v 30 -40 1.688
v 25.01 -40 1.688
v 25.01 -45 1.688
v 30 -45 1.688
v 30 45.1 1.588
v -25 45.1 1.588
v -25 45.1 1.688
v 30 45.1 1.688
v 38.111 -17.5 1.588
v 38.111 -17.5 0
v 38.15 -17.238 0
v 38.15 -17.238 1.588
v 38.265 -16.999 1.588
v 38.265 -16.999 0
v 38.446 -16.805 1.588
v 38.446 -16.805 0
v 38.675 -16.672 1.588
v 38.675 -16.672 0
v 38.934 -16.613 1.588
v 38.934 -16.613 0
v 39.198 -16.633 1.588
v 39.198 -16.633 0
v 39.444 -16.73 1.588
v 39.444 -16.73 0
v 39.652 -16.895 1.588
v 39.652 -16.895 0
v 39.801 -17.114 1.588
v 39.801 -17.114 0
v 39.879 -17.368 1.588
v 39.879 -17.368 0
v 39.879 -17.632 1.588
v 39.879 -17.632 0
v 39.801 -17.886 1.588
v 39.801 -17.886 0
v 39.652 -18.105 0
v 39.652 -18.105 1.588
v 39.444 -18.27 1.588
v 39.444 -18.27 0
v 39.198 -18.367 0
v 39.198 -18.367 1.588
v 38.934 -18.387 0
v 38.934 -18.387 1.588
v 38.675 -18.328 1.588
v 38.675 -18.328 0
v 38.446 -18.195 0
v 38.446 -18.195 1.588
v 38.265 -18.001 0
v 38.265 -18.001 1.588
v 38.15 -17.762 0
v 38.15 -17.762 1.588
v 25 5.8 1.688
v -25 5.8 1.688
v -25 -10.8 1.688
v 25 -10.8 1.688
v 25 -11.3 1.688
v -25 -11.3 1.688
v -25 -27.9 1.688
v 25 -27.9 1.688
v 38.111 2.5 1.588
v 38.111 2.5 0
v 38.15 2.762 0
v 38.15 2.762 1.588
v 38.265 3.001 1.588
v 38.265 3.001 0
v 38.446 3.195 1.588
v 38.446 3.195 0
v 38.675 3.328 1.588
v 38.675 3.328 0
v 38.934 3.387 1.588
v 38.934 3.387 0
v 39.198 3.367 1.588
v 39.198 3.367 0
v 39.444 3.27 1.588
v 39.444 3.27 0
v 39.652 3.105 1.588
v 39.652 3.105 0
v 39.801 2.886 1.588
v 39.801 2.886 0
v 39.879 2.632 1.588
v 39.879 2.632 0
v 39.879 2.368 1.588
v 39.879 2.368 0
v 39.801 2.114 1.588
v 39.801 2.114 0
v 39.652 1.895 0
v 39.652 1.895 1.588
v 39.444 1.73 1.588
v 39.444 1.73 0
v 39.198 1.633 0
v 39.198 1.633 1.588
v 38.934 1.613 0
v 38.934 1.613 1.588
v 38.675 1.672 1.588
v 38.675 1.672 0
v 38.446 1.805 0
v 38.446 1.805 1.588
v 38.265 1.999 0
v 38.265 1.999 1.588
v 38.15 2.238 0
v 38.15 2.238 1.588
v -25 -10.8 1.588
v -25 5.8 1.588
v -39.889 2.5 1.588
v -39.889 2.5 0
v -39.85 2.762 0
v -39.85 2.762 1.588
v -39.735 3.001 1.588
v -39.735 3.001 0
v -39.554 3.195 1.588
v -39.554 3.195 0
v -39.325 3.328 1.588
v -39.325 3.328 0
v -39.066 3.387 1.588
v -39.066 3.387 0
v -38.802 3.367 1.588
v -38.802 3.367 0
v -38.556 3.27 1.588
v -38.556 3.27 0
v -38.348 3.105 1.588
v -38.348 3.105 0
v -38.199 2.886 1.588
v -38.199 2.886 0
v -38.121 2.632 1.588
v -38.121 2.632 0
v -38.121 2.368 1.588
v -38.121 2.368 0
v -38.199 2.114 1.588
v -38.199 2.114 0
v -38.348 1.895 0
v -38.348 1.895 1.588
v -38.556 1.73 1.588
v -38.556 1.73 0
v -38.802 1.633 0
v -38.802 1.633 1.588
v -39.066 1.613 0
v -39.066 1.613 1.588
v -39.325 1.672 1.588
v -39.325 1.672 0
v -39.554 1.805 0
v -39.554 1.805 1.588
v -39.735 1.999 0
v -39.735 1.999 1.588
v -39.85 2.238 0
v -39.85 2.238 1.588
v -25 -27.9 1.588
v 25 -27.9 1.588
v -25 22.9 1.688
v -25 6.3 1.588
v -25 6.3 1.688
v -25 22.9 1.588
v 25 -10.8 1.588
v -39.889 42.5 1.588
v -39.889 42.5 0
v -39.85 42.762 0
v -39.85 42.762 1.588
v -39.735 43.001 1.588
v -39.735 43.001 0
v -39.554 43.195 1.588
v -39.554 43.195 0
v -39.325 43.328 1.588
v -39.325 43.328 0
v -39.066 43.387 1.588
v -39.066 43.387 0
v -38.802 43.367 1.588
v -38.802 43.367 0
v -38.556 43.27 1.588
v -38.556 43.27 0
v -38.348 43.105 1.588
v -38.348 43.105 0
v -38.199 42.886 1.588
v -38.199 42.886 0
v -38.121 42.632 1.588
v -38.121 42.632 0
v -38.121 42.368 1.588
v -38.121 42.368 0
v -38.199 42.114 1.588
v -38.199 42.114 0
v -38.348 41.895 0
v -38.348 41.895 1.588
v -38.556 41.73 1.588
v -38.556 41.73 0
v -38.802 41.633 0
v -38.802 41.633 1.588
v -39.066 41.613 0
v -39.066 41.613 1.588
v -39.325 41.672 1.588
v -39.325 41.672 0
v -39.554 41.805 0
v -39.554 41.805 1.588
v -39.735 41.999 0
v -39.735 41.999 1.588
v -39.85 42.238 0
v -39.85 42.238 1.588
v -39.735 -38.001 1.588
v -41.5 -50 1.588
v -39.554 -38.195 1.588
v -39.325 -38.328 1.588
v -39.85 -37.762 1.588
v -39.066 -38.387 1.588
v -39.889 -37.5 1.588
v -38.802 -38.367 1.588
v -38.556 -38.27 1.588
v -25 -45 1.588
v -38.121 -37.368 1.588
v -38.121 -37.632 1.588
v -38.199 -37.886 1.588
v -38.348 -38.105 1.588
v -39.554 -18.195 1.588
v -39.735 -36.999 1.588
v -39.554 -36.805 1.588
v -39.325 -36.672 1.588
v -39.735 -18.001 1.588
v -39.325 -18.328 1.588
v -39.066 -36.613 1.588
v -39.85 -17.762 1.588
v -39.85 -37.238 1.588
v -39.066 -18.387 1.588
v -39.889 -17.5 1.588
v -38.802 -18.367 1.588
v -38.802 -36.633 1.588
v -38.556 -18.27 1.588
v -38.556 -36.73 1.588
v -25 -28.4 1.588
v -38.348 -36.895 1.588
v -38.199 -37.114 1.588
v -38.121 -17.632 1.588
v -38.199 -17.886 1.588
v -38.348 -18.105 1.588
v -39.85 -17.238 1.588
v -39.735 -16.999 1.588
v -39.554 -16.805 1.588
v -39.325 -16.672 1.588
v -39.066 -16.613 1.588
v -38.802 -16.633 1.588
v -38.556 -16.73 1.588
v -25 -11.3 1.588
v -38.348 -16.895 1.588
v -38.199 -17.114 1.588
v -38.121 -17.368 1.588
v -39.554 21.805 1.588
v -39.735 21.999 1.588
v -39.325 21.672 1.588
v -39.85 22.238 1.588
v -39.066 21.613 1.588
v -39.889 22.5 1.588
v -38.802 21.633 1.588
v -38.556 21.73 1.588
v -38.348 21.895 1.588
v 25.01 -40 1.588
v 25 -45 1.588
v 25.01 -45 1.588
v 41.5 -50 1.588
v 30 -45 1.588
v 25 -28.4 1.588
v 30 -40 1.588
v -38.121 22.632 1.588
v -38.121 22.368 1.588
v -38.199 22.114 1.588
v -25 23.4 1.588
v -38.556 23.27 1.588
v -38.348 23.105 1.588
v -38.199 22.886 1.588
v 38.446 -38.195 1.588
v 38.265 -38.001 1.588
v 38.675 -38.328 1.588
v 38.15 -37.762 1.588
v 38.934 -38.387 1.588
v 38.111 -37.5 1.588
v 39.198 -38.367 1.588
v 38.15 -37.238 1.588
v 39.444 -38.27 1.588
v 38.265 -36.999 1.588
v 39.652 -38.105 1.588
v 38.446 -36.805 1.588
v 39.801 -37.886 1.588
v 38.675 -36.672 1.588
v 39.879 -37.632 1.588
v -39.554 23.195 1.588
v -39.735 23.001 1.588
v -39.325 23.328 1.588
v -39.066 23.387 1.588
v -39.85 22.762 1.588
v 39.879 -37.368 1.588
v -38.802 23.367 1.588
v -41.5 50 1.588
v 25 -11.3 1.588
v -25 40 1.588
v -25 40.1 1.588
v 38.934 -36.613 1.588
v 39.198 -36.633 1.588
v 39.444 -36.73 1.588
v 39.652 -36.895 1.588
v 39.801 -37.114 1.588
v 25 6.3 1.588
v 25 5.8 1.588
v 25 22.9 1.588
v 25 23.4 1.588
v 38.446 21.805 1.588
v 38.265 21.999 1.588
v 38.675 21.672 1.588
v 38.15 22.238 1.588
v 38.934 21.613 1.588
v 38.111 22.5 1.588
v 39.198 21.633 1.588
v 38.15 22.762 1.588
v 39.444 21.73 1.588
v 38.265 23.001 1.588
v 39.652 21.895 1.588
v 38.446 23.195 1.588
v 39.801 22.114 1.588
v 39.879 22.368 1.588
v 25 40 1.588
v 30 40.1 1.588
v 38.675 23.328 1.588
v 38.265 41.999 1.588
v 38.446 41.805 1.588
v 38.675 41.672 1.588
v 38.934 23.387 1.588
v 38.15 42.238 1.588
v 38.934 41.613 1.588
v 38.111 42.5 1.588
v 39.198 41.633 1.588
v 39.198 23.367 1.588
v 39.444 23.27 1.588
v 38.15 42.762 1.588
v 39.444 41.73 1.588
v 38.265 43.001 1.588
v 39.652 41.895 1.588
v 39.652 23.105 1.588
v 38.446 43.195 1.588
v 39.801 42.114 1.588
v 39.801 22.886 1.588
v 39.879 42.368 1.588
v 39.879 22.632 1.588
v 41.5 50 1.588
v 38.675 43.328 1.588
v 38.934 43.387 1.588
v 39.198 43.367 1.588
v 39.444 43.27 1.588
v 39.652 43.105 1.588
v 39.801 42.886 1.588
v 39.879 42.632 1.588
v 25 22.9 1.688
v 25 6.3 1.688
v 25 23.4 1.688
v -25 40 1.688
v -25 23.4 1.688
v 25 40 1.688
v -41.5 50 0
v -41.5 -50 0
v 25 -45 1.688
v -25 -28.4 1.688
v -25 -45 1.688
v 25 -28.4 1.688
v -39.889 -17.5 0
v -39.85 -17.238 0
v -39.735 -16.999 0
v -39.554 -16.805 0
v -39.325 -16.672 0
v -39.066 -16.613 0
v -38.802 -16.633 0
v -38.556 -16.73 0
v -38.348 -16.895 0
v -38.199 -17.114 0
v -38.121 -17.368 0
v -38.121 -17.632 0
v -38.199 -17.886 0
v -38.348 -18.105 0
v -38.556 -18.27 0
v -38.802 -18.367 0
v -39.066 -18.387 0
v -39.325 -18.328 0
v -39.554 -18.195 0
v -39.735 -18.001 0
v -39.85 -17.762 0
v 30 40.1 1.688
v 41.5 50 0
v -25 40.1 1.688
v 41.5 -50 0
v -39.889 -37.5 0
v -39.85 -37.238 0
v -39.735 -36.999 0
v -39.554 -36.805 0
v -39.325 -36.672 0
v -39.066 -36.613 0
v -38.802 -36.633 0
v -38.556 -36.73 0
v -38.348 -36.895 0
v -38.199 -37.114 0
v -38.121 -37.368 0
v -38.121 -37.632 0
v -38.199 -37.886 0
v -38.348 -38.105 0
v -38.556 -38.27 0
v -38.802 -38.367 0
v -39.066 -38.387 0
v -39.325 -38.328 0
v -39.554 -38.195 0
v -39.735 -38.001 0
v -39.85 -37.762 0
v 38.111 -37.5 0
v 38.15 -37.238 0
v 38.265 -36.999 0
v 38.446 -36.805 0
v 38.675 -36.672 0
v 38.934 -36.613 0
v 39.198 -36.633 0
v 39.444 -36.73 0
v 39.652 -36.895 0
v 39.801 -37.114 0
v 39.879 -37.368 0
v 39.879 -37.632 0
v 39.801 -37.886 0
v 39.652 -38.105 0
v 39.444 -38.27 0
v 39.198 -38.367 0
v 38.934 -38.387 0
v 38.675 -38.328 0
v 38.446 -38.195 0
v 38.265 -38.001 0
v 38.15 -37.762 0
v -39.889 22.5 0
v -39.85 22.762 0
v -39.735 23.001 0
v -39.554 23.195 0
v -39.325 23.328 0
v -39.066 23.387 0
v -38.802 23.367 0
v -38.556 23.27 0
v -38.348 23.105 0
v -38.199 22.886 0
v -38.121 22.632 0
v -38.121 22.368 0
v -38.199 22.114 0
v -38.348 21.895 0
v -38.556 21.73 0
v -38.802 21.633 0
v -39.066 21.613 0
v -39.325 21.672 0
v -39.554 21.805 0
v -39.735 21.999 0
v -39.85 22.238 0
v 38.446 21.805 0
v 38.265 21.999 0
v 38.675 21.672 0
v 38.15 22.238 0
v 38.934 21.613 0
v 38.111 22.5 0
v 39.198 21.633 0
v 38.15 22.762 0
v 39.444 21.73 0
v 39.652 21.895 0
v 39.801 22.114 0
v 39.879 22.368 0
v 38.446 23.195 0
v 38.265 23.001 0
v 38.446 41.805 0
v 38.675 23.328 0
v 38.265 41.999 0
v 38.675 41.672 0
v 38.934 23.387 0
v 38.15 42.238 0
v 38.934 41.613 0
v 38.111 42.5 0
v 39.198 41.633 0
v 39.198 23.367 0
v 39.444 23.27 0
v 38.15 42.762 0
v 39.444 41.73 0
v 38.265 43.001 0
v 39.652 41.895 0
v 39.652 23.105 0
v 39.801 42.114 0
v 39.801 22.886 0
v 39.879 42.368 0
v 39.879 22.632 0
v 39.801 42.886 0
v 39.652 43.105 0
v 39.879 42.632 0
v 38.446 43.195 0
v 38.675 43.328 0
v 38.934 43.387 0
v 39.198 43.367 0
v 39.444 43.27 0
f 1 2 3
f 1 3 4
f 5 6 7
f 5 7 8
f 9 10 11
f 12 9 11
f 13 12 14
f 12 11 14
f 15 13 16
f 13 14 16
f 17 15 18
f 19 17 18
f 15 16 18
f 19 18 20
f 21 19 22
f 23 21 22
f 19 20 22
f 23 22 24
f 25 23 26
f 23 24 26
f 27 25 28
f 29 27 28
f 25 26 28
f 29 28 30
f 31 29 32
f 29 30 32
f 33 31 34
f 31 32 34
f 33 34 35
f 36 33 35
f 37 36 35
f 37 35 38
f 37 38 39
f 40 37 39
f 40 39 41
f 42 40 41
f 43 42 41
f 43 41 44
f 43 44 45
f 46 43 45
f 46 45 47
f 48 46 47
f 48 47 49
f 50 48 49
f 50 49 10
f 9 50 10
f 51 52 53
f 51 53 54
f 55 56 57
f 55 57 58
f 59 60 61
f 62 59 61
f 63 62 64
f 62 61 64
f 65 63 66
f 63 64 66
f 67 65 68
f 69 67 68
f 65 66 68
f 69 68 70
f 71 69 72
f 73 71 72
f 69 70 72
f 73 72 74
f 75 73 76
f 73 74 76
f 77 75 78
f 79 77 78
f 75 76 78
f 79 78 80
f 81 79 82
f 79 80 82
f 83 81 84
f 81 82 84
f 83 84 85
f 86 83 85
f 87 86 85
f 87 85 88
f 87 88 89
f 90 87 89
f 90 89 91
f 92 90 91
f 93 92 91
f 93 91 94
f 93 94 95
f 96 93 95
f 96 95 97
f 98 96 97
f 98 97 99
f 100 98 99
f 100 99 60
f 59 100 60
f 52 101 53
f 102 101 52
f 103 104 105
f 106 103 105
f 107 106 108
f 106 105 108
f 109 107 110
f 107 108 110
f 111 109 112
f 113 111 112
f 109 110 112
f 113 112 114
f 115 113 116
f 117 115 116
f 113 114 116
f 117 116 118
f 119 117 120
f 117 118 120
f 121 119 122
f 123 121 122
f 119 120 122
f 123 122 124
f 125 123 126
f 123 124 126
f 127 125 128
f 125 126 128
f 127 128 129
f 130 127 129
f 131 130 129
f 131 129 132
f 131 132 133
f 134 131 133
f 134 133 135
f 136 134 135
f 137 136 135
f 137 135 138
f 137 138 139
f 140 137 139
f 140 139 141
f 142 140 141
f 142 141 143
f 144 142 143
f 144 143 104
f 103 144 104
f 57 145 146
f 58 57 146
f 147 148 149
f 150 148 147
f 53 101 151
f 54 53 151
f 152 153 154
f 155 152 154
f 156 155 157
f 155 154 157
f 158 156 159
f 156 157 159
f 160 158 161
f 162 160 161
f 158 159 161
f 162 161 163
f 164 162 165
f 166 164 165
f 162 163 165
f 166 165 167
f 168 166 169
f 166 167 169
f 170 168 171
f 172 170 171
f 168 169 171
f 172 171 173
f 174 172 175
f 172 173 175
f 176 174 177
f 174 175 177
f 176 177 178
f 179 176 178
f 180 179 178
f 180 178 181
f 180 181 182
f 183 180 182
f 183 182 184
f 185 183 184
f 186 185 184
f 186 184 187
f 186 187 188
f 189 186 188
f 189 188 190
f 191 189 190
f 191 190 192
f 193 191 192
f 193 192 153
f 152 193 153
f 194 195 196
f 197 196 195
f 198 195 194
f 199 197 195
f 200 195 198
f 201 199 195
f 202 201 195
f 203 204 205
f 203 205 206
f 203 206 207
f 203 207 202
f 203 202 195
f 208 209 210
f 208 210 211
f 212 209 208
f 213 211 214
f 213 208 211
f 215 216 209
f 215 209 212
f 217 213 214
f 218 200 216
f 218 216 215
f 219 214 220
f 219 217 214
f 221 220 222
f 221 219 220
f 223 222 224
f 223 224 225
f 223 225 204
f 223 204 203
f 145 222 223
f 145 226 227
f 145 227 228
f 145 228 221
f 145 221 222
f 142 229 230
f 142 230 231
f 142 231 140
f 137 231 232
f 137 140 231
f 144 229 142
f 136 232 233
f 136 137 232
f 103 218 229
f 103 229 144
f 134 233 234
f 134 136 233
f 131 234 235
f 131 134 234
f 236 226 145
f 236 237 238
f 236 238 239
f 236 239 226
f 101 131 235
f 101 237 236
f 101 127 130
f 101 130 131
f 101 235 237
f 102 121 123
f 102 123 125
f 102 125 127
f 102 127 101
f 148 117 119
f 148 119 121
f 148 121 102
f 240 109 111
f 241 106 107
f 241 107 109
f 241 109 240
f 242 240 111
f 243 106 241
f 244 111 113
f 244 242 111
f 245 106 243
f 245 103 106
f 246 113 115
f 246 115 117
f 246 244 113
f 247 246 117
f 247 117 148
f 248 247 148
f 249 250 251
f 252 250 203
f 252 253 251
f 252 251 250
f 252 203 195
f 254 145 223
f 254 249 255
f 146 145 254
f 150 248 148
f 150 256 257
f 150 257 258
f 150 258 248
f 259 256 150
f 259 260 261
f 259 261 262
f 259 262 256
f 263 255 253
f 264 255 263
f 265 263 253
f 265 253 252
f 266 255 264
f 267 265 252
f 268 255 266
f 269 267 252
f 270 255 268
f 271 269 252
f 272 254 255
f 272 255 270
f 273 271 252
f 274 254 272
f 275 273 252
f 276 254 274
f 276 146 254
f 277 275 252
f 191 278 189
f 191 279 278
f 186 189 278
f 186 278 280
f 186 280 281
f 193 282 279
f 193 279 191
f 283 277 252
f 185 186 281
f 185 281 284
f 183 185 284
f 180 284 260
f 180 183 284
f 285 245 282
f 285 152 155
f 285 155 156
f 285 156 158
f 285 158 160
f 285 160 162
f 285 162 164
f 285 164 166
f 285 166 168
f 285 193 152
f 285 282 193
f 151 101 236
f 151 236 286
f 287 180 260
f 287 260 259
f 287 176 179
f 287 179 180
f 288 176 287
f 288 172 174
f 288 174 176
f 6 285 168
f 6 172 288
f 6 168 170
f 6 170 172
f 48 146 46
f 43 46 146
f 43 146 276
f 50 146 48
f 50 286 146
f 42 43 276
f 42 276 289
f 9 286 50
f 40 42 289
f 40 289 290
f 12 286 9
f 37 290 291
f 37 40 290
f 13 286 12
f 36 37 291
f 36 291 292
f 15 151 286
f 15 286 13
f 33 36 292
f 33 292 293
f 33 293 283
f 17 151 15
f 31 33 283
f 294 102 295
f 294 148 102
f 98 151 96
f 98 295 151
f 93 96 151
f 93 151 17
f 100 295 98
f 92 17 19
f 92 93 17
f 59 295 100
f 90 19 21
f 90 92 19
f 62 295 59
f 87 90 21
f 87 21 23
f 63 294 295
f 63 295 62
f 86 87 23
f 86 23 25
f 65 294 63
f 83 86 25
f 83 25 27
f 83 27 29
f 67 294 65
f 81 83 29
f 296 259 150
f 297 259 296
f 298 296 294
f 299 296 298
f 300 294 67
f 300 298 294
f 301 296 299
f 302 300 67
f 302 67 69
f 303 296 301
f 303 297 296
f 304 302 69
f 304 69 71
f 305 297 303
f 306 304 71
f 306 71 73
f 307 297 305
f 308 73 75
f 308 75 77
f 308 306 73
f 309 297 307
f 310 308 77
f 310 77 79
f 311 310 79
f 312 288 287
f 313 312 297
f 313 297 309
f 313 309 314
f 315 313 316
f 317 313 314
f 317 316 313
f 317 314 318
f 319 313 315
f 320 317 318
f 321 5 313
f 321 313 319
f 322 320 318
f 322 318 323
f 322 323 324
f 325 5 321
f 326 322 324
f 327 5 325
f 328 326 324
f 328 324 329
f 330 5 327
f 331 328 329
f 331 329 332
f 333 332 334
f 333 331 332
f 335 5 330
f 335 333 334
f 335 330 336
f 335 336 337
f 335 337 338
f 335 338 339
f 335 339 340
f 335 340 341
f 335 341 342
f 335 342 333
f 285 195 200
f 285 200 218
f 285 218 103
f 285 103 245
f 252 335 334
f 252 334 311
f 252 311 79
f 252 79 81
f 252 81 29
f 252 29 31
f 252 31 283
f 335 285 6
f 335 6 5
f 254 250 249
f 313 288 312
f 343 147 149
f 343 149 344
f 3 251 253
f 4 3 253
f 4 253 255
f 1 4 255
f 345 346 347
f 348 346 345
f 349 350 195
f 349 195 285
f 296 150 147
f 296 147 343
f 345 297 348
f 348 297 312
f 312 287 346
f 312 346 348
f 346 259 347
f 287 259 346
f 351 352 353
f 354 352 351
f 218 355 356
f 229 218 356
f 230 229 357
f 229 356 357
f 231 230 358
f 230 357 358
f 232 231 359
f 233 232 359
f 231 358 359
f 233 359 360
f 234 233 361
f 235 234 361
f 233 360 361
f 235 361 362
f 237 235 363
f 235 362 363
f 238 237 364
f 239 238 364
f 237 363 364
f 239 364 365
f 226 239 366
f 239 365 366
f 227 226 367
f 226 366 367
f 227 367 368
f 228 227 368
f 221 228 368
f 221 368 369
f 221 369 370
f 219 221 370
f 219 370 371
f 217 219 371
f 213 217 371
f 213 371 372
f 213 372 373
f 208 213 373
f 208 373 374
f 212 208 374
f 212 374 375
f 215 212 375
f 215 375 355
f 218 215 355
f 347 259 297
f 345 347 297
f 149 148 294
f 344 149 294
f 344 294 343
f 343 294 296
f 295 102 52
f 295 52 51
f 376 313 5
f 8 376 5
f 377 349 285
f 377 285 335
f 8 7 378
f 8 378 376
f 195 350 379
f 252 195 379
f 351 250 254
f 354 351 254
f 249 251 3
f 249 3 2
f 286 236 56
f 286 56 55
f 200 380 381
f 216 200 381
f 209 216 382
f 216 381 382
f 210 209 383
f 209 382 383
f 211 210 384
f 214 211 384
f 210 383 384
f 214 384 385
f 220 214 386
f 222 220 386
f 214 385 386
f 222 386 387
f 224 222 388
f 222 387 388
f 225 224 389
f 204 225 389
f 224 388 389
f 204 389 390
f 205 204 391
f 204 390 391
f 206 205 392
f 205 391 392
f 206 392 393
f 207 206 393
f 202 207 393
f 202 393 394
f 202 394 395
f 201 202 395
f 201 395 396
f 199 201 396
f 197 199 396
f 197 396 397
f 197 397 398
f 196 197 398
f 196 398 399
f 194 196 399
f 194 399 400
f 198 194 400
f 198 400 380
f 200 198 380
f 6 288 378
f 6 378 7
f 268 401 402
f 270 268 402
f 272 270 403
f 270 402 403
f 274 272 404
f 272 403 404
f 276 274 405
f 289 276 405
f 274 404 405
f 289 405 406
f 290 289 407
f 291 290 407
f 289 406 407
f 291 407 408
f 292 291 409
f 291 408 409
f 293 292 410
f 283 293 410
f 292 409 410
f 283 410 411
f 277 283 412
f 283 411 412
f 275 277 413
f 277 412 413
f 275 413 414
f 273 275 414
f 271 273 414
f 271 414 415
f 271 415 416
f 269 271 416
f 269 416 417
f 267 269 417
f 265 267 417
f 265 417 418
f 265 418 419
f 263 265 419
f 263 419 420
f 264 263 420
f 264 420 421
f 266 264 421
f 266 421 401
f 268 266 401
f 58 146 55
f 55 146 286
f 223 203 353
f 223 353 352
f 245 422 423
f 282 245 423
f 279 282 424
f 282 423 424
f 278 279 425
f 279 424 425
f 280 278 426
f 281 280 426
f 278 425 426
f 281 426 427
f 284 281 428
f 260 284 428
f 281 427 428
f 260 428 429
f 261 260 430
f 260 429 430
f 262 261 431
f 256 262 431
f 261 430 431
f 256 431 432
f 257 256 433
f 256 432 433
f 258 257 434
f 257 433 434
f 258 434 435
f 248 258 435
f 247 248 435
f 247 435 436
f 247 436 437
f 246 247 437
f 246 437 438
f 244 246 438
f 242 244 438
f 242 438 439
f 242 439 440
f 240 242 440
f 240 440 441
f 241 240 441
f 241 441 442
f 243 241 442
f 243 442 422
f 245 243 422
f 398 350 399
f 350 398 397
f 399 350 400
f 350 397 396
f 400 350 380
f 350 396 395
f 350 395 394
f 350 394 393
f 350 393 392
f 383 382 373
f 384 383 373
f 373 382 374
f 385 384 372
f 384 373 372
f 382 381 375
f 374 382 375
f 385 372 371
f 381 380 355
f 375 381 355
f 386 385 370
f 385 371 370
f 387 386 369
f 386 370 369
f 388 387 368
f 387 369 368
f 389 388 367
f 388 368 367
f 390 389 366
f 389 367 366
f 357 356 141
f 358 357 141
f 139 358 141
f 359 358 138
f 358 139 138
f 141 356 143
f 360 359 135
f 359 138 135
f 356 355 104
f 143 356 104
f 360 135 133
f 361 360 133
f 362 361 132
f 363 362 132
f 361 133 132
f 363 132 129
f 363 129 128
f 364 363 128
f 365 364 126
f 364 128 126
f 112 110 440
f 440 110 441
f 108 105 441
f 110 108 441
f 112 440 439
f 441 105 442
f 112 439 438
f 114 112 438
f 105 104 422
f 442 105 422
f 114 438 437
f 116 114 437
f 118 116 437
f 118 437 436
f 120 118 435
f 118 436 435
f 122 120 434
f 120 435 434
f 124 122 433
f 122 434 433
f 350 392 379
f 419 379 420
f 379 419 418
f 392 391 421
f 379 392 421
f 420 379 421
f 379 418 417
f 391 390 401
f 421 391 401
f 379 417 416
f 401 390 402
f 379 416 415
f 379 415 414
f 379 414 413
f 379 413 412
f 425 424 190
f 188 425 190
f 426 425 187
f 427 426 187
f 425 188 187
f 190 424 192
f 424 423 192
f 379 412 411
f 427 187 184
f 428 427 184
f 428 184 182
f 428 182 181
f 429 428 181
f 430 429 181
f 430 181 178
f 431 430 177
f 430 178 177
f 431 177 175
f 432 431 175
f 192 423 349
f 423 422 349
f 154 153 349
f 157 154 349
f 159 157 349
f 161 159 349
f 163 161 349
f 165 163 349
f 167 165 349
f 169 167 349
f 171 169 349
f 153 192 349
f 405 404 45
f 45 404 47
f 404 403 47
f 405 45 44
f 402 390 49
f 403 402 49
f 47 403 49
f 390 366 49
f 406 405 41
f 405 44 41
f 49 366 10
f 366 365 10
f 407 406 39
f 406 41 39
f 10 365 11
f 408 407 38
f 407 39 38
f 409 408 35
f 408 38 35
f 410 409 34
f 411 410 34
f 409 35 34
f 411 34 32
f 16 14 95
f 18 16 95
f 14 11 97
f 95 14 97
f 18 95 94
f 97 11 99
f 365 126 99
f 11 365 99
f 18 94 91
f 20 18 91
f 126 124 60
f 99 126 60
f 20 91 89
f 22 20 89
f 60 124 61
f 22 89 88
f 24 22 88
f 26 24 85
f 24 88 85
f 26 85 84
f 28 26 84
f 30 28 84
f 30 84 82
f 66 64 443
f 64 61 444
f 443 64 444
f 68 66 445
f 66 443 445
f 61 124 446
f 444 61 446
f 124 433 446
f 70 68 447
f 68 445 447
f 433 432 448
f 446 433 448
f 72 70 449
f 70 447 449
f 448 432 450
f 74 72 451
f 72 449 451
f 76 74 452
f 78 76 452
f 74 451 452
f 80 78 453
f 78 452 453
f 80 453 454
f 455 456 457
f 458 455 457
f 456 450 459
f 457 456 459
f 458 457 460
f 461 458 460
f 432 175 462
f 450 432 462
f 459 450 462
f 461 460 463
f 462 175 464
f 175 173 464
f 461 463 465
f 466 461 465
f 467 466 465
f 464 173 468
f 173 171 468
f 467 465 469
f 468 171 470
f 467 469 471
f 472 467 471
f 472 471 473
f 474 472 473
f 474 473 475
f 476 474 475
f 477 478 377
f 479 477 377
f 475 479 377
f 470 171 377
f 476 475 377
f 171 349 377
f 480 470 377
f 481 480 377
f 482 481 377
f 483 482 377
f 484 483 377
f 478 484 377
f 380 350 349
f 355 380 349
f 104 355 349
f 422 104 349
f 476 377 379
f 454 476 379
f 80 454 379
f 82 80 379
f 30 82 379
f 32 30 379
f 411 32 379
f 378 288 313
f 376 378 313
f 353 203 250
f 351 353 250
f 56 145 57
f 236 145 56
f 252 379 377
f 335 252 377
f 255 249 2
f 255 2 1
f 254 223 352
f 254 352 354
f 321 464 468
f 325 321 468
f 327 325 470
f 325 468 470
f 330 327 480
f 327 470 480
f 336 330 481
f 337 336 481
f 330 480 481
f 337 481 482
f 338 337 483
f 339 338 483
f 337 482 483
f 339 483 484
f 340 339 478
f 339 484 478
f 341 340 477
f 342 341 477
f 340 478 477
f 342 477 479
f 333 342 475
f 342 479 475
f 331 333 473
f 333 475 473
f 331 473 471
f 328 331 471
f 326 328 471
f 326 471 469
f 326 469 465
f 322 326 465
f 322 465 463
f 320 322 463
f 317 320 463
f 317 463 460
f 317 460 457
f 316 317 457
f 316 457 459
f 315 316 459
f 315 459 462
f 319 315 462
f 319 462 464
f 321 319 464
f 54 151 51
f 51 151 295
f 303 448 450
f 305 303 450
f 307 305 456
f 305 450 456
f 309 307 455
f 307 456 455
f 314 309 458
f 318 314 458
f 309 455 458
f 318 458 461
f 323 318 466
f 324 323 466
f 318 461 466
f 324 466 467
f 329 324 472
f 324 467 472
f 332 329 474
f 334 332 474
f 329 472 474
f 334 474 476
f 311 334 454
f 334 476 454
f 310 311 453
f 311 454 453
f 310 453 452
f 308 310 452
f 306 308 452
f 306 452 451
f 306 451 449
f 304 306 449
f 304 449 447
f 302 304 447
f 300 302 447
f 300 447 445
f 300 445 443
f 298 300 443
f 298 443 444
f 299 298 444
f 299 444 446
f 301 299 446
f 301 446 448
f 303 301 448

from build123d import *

# Parameters (mm, degrees)
SKETCH1_W                 = 83
SKETCH1_H                 = 100
BOSS_EXTRUDE1_DEPTH       = 1.5875
F_0_CLEARANCE_HOLE1_D     = 1.778
F_0_CLEARANCE_HOLE1_DEPTH = 3.175
F_0_CLEARANCE_HOLE1_TIP   = 0.53416509
SKETCH5_W                 = 50
SKETCH5_H                 = 16.6
BOSS_EXTRUDE3_DEPTH       = 0.1
SKETCH6_W                 = 55
SKETCH6_H                 = 5
BOSS_EXTRUDE4_DEPTH       = 0.1
SKETCH7_W                 = 4.99
SKETCH7_H                 = 5
BOSS_EXTRUDE5_DEPTH       = 0.1


with BuildPart() as part:
    # Sketch1 → Boss-Extrude1 (new body)
    with BuildSketch(Plane.XY):
        Rectangle(SKETCH1_W, SKETCH1_H)
    extrude(amount=BOSS_EXTRUDE1_DEPTH)

    # #0 Clearance Hole1
    with Locations(Plane.XY.offset(1.5875)):
        with Locations((-39, 42.5), (-39, 22.5), (-39, 2.5), (-39, -17.5), (-39, -37.5), (39, -37.5), (39, -17.5), (39, 2.5), (39, 22.5), (39, 42.5)):
            Hole(F_0_CLEARANCE_HOLE1_D / 2, depth=F_0_CLEARANCE_HOLE1_DEPTH)
            with Locations((0, 0, -(F_0_CLEARANCE_HOLE1_DEPTH + F_0_CLEARANCE_HOLE1_TIP / 2))):  # 118° drill point
                Cone(0, F_0_CLEARANCE_HOLE1_D / 2, F_0_CLEARANCE_HOLE1_TIP, mode=Mode.SUBTRACT)

    # Sketch5 → Boss-Extrude3 (add)
    with BuildSketch(Plane.XY.offset(1.5875)):
        with Locations((0, 14.6)):
            Rectangle(SKETCH5_W, SKETCH5_H)
        with Locations((0, 31.7)):
            Rectangle(SKETCH5_W, SKETCH5_H)
        with Locations((0, -2.5)):
            Rectangle(SKETCH5_W, SKETCH5_H)
        with Locations((0, -19.6)):
            Rectangle(SKETCH5_W, SKETCH5_H)
        with Locations((0, -36.7)):
            Rectangle(SKETCH5_W, SKETCH5_H)
    extrude(amount=BOSS_EXTRUDE3_DEPTH)

    # Sketch6 → Boss-Extrude4 (add)
    with BuildSketch(Plane.XY.offset(1.5875)):
        with Locations((2.5, 42.6)):
            Rectangle(SKETCH6_W, SKETCH6_H)
    extrude(amount=BOSS_EXTRUDE4_DEPTH)

    # Sketch7 → Boss-Extrude5 (add)
    with BuildSketch(Plane.XY.offset(1.5875)):
        with Locations((27.505, -42.5)):
            Rectangle(SKETCH7_W, SKETCH7_H)
    extrude(amount=BOSS_EXTRUDE5_DEPTH)


solid = part.part
